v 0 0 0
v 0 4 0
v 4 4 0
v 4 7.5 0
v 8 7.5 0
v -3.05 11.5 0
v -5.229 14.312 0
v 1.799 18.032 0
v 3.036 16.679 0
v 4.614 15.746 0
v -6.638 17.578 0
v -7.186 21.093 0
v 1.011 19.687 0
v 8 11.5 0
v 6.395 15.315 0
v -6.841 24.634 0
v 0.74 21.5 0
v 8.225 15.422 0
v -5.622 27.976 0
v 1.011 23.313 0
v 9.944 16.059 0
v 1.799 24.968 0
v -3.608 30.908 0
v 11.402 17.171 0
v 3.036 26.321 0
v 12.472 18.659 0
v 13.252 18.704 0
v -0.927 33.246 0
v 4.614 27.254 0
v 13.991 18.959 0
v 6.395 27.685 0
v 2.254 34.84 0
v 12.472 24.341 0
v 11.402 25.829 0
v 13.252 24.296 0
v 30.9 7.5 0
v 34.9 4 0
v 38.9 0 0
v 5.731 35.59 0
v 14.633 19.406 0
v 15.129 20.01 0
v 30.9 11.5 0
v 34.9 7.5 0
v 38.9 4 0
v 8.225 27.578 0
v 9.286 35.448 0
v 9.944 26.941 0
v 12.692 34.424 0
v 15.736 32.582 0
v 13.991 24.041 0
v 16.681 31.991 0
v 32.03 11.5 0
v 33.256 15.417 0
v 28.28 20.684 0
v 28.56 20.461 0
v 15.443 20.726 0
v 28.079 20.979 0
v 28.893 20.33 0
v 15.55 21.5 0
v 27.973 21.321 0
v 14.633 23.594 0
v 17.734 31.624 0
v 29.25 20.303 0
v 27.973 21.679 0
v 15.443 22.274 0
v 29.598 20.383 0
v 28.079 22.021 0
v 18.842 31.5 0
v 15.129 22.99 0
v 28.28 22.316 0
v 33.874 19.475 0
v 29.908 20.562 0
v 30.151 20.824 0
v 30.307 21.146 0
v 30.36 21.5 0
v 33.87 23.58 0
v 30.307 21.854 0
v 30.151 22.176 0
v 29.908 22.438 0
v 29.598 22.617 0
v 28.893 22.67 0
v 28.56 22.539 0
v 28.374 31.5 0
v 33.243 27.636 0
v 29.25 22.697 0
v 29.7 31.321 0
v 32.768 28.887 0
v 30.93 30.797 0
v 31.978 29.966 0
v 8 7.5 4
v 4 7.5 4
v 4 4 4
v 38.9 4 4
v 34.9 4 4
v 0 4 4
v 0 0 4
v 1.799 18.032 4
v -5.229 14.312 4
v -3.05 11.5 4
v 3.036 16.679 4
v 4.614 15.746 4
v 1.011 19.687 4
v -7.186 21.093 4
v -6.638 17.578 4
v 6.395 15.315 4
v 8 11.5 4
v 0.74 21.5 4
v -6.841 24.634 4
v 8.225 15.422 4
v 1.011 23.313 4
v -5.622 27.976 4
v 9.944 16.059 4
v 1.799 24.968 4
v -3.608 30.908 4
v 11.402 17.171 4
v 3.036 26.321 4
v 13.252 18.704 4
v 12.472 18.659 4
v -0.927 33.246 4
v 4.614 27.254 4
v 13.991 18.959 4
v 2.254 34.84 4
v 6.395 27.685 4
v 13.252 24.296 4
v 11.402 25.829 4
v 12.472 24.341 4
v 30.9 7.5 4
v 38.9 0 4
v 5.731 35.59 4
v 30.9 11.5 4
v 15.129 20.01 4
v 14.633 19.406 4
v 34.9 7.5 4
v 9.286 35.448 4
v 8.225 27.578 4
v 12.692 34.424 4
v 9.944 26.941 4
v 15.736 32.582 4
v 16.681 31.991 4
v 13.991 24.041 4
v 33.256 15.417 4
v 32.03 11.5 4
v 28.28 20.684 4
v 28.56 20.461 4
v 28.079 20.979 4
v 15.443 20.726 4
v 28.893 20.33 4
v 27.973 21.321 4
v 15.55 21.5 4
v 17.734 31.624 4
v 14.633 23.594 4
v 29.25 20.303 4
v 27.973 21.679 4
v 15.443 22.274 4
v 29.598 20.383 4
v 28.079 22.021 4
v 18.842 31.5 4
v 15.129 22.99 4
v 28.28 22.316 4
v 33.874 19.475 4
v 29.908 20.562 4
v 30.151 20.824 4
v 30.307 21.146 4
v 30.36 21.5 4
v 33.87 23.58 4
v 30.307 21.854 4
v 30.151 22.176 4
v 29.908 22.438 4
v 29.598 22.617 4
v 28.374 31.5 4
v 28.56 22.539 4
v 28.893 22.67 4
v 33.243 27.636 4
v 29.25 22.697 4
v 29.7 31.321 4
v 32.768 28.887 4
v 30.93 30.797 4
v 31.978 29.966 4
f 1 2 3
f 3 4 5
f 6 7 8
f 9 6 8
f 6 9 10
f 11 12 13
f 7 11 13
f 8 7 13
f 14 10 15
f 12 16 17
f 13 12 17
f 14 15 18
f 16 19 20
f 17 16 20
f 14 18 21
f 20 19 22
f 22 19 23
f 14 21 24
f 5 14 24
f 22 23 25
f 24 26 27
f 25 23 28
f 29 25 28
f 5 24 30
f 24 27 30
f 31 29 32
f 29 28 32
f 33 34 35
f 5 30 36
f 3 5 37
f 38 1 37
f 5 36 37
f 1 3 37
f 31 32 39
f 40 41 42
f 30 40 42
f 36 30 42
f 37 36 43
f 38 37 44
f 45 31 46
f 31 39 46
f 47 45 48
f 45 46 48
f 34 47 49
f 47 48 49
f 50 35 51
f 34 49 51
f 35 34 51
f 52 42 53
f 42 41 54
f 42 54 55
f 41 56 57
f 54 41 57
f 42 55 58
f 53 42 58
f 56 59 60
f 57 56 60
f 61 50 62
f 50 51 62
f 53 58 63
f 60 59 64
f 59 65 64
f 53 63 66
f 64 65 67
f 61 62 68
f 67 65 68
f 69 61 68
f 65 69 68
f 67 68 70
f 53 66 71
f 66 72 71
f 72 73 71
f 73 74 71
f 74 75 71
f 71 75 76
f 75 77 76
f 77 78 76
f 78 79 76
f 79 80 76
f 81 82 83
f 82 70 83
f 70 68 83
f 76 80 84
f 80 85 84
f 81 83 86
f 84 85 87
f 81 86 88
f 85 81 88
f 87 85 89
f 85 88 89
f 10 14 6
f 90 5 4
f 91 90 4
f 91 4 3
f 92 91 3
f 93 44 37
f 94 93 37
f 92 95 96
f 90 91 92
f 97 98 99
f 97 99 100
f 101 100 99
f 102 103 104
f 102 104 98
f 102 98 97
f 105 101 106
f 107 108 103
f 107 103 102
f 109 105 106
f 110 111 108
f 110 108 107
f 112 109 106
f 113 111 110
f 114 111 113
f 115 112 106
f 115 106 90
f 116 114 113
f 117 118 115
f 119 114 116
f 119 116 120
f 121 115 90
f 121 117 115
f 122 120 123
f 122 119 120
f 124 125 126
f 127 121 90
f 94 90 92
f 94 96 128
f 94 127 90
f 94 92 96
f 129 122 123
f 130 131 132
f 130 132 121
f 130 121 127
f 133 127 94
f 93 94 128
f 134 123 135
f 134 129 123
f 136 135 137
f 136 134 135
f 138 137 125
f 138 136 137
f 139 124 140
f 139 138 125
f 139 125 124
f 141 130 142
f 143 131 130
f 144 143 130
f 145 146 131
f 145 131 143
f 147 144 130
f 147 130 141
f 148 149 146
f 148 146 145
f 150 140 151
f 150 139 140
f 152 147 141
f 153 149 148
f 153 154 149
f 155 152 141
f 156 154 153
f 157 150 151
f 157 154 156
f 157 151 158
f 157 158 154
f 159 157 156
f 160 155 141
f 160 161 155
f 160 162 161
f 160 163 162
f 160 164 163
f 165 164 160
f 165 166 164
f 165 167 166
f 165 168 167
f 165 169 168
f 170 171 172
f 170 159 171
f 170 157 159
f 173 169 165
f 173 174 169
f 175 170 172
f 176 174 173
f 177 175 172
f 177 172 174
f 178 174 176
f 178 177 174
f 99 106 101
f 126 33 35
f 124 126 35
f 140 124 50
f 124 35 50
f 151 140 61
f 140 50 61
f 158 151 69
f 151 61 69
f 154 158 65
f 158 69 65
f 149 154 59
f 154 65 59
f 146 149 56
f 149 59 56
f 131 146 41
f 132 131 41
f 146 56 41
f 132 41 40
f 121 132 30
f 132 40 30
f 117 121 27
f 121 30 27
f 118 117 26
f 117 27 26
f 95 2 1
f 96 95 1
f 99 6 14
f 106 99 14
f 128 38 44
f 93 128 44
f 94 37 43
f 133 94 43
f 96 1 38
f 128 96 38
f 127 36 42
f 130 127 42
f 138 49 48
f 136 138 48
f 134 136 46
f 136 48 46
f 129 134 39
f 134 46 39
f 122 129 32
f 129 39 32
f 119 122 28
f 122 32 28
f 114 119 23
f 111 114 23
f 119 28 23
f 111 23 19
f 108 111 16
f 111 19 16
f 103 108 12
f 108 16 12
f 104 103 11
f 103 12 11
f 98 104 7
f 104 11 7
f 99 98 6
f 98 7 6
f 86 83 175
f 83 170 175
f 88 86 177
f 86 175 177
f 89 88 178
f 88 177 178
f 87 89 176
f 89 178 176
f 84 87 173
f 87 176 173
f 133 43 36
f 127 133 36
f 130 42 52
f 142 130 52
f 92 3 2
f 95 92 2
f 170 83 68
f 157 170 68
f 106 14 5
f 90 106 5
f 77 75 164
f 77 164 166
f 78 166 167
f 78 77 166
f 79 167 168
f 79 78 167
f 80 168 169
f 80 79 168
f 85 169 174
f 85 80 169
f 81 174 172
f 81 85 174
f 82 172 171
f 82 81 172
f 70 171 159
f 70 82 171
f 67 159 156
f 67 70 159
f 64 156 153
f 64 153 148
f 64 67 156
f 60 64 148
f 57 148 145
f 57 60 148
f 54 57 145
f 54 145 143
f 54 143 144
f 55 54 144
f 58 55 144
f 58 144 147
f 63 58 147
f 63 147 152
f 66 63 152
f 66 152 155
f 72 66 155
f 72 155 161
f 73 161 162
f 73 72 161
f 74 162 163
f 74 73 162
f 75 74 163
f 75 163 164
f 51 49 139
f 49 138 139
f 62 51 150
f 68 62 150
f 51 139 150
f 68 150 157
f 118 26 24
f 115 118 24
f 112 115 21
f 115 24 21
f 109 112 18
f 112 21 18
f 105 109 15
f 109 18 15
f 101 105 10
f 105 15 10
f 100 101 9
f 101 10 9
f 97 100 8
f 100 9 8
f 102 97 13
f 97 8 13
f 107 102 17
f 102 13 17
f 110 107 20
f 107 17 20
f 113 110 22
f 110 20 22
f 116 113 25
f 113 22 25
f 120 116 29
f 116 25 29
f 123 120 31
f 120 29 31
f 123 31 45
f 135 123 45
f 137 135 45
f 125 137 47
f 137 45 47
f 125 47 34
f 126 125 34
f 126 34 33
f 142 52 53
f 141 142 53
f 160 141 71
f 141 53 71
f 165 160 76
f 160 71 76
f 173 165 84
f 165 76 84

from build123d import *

# Parameters (mm, degrees)
SKETCH2_R           = 1.2
BOSS_EXTRUDE1_DEPTH = 4
FILLET1_R           = 5


with BuildPart() as part:
    # Sketch2 → Boss-Extrude1 (new body)
    with BuildSketch(Plane.XY):
        with BuildLine():
            Line((0, 4), (0, 0))
            Line((0, 0), (38.9, 0))
            Line((38.9, 0), (38.9, 4))
            Line((38.9, 4), (34.9, 4))
            Line((34.9, 4), (34.9, 7.5))
            Line((34.9, 7.5), (30.9, 7.5))
            Line((30.9, 7.5), (30.9, 11.5))
            Line((30.9, 11.5), (32.029872408, 11.5))
            ThreePointArc((32.029872408, 11.5), (33.95, 21.5), (32.029872408, 31.5))
            Line((32.029872408, 31.5), (16.95, 31.5))
            ThreePointArc((16.95, 31.5), (-3.05, 31.5), (-3.05, 11.5))
            Line((-3.05, 11.5), (8, 11.5))
            Line((8, 11.5), (8, 7.5))
            Line((8, 7.5), (4, 7.5))
            Line((4, 7.5), (4, 4))
            Line((4, 4), (0, 4))
        make_face()
        with BuildLine():
            ThreePointArc((12.472095652, 24.340873036), (15.55, 21.5), (12.472095652, 18.659126964))
            ThreePointArc((12.472095652, 18.659126964), (0.74, 21.5), (12.472095652, 24.340873036))
        make_face(mode=Mode.SUBTRACT)
        with Locations((29.16, 21.5)):
            Circle(SKETCH2_R, mode=Mode.SUBTRACT)
    extrude(amount=BOSS_EXTRUDE1_DEPTH)

    # Fillet1
    fillet1_edges = [part.edges().sort_by_distance(p)[0] for p in [
        (16.95, 31.5, 2),
        (32.029872408, 31.5, 2),
    ]]
    fillet(fillet1_edges, radius=FILLET1_R)


solid = part.part
